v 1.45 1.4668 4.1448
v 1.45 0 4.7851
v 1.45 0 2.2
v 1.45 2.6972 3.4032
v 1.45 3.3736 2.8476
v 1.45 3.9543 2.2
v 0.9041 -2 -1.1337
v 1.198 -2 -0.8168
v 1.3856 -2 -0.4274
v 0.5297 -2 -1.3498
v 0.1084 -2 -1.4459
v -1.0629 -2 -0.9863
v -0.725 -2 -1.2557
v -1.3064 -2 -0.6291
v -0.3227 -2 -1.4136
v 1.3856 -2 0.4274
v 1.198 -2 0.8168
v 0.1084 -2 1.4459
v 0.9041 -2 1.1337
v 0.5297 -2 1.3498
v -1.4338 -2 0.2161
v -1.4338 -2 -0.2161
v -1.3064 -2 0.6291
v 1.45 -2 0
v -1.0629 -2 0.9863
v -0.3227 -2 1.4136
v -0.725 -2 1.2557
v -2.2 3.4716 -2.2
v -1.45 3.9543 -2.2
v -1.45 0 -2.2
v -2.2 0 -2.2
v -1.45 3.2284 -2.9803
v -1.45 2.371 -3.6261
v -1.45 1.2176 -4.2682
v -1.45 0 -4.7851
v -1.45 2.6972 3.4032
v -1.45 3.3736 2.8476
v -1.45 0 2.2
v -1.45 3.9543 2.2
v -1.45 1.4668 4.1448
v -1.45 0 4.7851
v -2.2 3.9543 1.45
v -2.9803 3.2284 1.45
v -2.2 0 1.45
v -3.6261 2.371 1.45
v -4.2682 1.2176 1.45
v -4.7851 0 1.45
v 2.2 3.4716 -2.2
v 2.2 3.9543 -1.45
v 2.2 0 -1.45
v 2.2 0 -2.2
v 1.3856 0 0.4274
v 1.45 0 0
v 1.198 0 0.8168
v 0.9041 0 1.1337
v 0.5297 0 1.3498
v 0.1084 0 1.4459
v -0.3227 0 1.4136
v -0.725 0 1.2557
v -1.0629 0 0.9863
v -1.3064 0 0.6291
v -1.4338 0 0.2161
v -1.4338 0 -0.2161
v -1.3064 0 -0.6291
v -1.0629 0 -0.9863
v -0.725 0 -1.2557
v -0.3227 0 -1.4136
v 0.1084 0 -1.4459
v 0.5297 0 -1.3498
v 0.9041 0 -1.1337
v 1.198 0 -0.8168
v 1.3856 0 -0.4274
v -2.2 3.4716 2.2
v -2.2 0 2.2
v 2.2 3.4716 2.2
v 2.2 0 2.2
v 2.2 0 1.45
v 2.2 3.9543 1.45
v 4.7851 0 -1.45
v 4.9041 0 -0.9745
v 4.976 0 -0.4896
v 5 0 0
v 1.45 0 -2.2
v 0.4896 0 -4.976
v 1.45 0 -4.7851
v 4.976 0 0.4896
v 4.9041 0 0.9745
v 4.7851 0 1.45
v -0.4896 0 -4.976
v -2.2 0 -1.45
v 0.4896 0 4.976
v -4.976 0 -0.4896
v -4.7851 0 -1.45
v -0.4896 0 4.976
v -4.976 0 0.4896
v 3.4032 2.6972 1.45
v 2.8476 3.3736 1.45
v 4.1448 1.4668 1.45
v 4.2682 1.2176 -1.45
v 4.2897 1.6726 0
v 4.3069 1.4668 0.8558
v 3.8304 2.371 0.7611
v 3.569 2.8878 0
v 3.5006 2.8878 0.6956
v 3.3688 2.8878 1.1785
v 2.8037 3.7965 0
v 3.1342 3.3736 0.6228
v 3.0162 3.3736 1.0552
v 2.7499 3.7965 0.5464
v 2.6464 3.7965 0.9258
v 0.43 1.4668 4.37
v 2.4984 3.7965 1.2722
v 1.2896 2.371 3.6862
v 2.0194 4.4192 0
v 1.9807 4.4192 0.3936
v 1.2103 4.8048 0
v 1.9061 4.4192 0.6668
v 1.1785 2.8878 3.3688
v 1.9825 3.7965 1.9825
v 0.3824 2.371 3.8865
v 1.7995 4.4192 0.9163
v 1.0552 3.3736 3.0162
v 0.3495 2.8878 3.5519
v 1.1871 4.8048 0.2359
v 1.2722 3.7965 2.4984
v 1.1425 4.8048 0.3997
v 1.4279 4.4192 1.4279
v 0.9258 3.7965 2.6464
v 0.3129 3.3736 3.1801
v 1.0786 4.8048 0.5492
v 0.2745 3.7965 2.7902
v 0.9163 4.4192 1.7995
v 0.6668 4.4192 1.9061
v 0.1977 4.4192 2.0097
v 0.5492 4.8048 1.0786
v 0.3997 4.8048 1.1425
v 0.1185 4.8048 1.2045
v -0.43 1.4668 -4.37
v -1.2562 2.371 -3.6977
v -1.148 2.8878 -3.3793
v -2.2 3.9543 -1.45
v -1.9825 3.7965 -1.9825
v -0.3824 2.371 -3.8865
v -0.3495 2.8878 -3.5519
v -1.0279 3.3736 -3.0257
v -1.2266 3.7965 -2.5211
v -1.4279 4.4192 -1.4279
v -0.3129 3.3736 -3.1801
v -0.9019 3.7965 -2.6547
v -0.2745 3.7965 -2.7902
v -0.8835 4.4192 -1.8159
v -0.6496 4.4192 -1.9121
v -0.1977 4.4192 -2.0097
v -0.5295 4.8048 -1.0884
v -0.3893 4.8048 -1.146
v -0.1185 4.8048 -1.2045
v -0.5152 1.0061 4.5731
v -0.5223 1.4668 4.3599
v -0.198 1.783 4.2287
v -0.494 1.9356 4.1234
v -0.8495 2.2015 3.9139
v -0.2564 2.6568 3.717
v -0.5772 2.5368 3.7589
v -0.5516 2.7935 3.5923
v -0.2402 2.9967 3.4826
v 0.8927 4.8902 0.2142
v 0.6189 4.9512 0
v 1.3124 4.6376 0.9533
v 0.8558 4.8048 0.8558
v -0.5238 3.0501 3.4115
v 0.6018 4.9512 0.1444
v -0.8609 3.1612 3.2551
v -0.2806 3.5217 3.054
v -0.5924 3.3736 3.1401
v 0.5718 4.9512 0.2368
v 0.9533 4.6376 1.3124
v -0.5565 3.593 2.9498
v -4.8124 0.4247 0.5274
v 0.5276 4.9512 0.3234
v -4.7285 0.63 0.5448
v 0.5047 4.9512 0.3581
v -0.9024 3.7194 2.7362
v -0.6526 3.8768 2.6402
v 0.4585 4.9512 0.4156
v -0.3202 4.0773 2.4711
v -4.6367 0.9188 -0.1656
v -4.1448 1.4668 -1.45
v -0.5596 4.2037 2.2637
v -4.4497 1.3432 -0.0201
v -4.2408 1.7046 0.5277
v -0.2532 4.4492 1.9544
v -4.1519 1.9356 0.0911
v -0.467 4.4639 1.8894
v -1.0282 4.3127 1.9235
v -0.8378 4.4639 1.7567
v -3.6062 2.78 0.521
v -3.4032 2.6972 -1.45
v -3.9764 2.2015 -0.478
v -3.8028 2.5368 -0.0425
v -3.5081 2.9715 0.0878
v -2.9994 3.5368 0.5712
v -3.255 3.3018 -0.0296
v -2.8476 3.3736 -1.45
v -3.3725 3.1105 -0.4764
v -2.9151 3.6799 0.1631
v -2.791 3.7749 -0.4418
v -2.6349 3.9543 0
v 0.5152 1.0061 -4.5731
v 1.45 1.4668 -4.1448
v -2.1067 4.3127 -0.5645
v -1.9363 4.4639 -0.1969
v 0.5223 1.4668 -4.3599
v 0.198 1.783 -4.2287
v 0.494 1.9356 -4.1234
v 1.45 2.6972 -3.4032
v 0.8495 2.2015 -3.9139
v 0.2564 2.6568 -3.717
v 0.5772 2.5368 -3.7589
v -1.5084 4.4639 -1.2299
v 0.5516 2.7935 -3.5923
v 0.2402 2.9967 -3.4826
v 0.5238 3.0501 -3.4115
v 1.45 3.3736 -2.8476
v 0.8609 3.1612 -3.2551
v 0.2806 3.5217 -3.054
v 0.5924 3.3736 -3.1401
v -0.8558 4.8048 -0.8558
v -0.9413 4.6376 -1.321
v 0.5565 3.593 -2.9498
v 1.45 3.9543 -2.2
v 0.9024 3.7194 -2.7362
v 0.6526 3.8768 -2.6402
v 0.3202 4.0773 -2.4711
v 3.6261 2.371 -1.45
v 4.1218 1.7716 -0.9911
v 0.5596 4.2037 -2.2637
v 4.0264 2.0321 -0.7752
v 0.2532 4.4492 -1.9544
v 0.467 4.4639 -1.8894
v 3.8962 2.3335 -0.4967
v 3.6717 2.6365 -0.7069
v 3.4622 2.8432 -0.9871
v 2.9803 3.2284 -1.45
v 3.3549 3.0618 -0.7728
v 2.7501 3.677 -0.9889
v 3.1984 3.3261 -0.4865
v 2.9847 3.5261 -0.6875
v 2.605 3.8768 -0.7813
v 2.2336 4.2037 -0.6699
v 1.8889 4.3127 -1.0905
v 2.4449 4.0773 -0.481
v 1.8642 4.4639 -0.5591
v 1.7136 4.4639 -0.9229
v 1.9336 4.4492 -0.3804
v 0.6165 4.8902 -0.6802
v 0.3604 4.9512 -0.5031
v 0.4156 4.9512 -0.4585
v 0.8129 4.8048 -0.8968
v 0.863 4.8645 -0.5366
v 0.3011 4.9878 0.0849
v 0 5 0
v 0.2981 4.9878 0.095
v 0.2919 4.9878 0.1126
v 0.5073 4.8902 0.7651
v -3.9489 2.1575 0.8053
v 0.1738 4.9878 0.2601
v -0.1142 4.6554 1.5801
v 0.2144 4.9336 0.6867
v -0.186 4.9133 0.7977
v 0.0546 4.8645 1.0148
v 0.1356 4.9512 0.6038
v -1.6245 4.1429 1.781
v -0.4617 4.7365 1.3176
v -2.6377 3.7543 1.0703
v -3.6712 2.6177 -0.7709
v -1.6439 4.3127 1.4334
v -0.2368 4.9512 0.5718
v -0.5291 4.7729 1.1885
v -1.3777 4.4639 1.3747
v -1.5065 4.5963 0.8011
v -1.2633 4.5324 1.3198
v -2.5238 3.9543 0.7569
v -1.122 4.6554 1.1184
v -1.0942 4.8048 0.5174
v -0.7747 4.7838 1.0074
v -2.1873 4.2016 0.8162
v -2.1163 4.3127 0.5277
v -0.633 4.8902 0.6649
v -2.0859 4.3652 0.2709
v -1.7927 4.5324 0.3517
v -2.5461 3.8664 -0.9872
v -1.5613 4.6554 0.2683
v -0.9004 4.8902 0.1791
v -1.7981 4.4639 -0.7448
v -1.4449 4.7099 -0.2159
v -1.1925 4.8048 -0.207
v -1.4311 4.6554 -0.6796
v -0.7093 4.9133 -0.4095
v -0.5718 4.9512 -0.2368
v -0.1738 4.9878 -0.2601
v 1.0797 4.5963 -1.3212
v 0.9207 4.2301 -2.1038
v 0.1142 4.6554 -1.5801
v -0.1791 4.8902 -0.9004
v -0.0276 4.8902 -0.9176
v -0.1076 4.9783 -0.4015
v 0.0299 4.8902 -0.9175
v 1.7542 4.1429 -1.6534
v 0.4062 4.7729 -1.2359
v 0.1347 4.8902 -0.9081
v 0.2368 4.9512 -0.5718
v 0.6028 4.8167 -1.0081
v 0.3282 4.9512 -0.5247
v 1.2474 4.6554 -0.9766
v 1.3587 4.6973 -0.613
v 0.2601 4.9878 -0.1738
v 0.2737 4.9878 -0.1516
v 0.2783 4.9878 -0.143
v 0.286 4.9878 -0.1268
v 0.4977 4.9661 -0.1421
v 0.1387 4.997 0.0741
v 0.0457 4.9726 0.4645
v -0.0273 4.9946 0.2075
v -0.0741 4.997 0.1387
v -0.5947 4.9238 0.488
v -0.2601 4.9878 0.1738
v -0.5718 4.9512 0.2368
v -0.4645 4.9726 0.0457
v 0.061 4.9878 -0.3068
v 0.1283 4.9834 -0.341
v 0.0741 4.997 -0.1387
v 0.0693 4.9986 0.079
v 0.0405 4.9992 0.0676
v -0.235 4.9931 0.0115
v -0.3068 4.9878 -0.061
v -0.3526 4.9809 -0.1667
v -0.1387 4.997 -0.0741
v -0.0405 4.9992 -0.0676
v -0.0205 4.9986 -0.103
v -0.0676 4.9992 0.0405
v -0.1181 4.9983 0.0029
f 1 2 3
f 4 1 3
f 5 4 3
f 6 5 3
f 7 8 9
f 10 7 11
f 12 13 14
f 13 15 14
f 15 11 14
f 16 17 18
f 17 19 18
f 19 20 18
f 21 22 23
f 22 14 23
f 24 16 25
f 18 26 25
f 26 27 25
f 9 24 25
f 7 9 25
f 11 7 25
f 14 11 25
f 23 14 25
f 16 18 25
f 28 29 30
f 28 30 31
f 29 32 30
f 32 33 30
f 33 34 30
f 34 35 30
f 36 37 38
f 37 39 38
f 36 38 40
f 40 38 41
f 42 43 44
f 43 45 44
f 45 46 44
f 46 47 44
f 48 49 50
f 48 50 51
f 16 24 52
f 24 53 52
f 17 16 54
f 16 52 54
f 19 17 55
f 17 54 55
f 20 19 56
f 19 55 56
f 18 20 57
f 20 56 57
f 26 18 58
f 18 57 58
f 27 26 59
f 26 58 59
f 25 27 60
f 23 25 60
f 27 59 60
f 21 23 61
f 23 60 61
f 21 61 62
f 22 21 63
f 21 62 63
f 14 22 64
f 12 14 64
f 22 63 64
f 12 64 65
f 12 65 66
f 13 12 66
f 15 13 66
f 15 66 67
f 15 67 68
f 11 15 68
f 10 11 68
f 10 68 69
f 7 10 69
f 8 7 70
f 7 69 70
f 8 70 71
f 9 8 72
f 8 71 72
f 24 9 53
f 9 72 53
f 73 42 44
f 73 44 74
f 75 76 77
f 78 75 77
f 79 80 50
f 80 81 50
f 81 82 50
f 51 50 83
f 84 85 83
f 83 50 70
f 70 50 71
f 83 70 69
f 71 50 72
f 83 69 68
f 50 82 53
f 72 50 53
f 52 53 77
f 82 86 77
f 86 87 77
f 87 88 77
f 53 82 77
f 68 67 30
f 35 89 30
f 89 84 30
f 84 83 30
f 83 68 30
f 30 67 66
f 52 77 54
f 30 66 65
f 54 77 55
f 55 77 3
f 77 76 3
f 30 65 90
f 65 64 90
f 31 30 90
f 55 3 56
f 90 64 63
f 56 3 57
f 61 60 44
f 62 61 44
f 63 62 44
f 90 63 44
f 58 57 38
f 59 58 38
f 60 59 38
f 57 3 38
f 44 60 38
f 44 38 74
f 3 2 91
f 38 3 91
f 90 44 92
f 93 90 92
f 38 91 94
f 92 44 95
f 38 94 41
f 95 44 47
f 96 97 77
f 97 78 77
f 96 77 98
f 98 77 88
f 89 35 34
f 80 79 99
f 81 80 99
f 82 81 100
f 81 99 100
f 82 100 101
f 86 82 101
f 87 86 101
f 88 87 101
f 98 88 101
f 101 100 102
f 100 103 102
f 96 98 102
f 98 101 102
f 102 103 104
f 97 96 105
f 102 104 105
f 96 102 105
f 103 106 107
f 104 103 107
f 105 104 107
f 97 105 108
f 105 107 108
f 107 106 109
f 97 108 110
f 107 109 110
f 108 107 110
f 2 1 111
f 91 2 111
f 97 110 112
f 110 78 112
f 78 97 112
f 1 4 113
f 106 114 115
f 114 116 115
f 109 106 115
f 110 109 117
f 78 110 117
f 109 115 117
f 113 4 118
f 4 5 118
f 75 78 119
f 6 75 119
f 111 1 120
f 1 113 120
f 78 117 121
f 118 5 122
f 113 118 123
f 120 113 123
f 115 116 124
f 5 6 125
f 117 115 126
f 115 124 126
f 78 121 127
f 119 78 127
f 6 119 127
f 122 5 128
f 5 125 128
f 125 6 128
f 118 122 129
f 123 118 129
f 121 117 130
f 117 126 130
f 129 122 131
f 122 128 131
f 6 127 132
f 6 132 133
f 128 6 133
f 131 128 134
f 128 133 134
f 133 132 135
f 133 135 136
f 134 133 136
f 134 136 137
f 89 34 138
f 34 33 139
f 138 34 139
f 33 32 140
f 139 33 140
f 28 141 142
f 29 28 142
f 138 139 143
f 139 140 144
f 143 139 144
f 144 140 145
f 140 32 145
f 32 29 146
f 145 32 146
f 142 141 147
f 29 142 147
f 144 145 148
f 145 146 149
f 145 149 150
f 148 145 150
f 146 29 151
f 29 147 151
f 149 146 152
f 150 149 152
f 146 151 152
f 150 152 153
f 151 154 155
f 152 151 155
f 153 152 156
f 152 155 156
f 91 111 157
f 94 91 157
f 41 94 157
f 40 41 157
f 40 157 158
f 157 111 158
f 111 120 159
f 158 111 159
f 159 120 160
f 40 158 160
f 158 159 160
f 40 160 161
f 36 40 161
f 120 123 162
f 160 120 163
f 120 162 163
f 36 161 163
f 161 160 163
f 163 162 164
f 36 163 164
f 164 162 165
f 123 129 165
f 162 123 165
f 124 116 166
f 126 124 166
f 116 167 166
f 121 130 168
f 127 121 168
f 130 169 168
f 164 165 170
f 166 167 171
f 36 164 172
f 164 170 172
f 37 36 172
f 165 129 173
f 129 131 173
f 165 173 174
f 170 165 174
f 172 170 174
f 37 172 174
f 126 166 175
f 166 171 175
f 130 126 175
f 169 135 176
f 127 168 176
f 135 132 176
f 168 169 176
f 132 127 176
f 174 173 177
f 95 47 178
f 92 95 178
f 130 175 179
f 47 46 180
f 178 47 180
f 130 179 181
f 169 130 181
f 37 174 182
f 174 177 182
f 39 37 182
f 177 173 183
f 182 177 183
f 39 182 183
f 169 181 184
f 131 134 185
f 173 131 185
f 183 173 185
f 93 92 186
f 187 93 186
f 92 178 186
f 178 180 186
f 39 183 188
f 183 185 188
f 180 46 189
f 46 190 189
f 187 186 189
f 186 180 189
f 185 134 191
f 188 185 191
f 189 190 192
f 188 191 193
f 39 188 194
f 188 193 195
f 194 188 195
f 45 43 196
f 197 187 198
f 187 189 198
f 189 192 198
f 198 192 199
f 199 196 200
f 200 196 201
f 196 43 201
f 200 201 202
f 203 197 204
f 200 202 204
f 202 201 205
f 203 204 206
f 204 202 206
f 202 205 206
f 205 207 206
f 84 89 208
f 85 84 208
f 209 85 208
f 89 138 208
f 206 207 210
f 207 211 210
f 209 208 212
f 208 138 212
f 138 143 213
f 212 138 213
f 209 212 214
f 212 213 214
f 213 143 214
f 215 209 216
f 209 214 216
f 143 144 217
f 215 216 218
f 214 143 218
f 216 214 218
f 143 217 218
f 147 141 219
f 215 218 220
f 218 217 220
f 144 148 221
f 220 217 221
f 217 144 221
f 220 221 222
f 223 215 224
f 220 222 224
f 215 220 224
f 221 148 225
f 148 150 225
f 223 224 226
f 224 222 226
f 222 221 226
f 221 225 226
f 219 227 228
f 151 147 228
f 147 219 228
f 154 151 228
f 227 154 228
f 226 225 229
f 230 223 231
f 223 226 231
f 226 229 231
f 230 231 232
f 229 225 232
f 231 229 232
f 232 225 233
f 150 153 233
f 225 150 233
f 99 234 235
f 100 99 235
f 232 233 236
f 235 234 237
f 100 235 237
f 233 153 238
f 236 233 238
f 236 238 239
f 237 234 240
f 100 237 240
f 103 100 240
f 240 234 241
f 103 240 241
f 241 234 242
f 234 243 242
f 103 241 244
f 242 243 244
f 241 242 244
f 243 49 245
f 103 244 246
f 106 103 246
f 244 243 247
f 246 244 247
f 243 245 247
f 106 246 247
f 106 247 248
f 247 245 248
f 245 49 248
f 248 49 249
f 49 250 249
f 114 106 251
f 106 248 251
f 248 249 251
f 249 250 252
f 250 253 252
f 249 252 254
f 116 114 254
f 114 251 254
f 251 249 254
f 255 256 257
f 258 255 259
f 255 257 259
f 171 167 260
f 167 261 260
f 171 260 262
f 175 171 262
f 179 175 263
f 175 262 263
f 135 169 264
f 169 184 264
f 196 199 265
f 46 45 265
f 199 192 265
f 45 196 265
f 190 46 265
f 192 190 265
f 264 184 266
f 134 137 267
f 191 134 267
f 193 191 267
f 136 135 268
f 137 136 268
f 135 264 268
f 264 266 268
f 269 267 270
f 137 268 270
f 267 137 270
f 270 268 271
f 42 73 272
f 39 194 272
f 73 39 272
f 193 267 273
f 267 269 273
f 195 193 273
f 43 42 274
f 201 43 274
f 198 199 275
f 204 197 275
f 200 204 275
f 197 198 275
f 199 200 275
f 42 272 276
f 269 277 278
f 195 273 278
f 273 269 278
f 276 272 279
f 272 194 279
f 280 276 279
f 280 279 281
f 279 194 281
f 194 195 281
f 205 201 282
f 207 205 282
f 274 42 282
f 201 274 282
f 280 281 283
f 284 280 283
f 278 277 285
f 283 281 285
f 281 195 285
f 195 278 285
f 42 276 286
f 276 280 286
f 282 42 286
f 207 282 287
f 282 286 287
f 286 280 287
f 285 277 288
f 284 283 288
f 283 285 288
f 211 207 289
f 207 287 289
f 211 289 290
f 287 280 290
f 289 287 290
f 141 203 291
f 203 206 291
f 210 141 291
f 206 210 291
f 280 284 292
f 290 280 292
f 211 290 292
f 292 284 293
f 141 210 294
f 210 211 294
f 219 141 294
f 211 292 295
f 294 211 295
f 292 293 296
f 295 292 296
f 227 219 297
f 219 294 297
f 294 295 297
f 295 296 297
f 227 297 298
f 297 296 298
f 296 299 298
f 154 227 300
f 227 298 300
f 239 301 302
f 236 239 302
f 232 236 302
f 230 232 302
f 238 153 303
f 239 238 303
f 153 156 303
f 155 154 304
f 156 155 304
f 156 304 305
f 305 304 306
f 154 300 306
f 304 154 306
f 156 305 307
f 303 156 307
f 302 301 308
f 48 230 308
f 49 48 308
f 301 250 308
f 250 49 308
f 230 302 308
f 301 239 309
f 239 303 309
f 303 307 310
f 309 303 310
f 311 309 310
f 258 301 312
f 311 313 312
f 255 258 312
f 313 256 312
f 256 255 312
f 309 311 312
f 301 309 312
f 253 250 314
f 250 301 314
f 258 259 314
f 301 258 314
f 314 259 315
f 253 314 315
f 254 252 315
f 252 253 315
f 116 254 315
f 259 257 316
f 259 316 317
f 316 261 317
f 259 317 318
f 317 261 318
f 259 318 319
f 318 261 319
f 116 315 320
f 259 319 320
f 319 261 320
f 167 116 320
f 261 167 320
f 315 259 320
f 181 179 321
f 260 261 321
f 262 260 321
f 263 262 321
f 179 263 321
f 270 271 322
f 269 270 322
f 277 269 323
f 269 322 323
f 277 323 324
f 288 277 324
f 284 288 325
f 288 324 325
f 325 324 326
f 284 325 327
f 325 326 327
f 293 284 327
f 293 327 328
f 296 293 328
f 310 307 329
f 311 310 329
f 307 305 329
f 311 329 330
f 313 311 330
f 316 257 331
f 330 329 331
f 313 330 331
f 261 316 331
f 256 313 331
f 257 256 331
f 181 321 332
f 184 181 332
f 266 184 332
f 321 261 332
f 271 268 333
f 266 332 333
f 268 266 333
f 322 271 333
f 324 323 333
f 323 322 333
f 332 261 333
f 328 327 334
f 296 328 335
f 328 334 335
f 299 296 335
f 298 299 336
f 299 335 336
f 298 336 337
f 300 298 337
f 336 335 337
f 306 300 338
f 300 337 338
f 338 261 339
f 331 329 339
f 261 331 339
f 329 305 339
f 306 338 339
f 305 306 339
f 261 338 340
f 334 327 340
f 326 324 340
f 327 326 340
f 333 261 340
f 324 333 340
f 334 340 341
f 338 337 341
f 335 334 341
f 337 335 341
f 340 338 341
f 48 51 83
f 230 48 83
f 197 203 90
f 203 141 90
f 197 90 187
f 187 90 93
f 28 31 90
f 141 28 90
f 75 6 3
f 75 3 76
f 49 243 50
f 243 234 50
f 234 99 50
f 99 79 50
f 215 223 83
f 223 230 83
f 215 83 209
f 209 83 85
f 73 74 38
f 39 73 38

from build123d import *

# Parameters (mm, degrees)
SKETCH3_W          = 1.45
SKETCH3_H          = 2
CUT_EXTRUDE1_REACH = 7


with BuildPart() as part:
    # Sketch3 → Revolve1 (revolve)
    with BuildSketch(Plane.XY):
        with BuildLine():
            add(Edge.make_bspline(
                [(5, 0), (3.201562119, 5), (0, 5)],
                knots=[0, 0, 0, 1, 1, 1], degree=2))
            Line((0, 5), (0, 0.5))
            Line((0, 0.5), (0, 0))
            Line((0, 0), (1.45, 0))
            Line((1.45, 0), (2.5, 0))
            Line((2.5, 0), (5, 0))
        make_face()
        with BuildLine():
            add(Edge.make_bspline(
                [(5, 0), (3.201562119, 5), (0, 5)],
                knots=[0, 0, 0, 1, 1, 1], degree=2))
            Line((0, 5), (0, 0.5))
            Line((0, 0.5), (0, 0))
            Line((0, 0), (1.45, 0))
            Line((1.45, 0), (2.5, 0))
            Line((2.5, 0), (5, 0))
        make_face()
        with Locations((0.725, -1)):
            Rectangle(SKETCH3_W, SKETCH3_H)
    revolve(axis=Axis((0, 5, 0), (0, -1, 0)))

    # Sketch5 → Cut-Extrude1 (cut, up to next)
    with BuildSketch(Plane.XZ, mode=Mode.PRIVATE) as cut_extrude1_sk1:
        with BuildLine():
            Line((-2.2, 2.2), (-1.45, 2.2))
            Line((-1.45, 2.2), (-1.45, 4.785133227))
            ThreePointArc((-1.45, 4.785133227), (-3.535533906, 3.535533906), (-4.785133227, 1.45))
            Line((-4.785133227, 1.45), (-2.2, 1.45))
            Line((-2.2, 1.45), (-2.2, 2.2))
        make_face()
    cut_extrude1_tool1 = extrude(cut_extrude1_sk1.sketch, amount=-CUT_EXTRUDE1_REACH, mode=Mode.PRIVATE) & part.part
    add(cut_extrude1_tool1.solids().sort_by_distance((-2.819915, 0, 2.819915))[0], mode=Mode.SUBTRACT)
    # Sketch5 → Cut-Extrude1 (cut, up to next)
    with BuildSketch(Plane.XZ, mode=Mode.PRIVATE) as cut_extrude1_sk2:
        with BuildLine():
            Line((1.45, 2.2), (2.2, 2.2))
            Line((2.2, 2.2), (2.2, 1.45))
            Line((2.2, 1.45), (4.785133227, 1.45))
            ThreePointArc((4.785133227, 1.45), (3.535533906, 3.535533906), (1.45, 4.785133227))
            Line((1.45, 4.785133227), (1.45, 2.2))
        make_face()
    cut_extrude1_tool2 = extrude(cut_extrude1_sk2.sketch, amount=-CUT_EXTRUDE1_REACH, mode=Mode.PRIVATE) & part.part
    add(cut_extrude1_tool2.solids().sort_by_distance((2.819915, 0, 2.819915))[0], mode=Mode.SUBTRACT)
    # Sketch5 → Cut-Extrude1 (cut, up to next)
    with BuildSketch(Plane.XZ, mode=Mode.PRIVATE) as cut_extrude1_sk3:
        with BuildLine():
            Line((4.785133227, -1.45), (2.2, -1.45))
            Line((2.2, -1.45), (2.2, -2.2))
            Line((2.2, -2.2), (1.45, -2.2))
            Line((1.45, -2.2), (1.45, -4.785133227))
            ThreePointArc((1.45, -4.785133227), (3.535533906, -3.535533906), (4.785133227, -1.45))
        make_face()
    cut_extrude1_tool3 = extrude(cut_extrude1_sk3.sketch, amount=-CUT_EXTRUDE1_REACH, mode=Mode.PRIVATE) & part.part
    add(cut_extrude1_tool3.solids().sort_by_distance((2.819915, 0, -2.819915))[0], mode=Mode.SUBTRACT)
    # Sketch5 → Cut-Extrude1 (cut, up to next)
    with BuildSketch(Plane.XZ, mode=Mode.PRIVATE) as cut_extrude1_sk4:
        with BuildLine():
            Line((-2.2, -2.2), (-2.2, -1.45))
            Line((-2.2, -1.45), (-4.785133227, -1.45))
            ThreePointArc((-4.785133227, -1.45), (-3.535533906, -3.535533906), (-1.45, -4.785133227))
            Line((-1.45, -4.785133227), (-1.45, -2.2))
            Line((-1.45, -2.2), (-2.2, -2.2))
        make_face()
    cut_extrude1_tool4 = extrude(cut_extrude1_sk4.sketch, amount=-CUT_EXTRUDE1_REACH, mode=Mode.PRIVATE) & part.part
    add(cut_extrude1_tool4.solids().sort_by_distance((-2.819915, 0, -2.819915))[0], mode=Mode.SUBTRACT)


solid = part.part
